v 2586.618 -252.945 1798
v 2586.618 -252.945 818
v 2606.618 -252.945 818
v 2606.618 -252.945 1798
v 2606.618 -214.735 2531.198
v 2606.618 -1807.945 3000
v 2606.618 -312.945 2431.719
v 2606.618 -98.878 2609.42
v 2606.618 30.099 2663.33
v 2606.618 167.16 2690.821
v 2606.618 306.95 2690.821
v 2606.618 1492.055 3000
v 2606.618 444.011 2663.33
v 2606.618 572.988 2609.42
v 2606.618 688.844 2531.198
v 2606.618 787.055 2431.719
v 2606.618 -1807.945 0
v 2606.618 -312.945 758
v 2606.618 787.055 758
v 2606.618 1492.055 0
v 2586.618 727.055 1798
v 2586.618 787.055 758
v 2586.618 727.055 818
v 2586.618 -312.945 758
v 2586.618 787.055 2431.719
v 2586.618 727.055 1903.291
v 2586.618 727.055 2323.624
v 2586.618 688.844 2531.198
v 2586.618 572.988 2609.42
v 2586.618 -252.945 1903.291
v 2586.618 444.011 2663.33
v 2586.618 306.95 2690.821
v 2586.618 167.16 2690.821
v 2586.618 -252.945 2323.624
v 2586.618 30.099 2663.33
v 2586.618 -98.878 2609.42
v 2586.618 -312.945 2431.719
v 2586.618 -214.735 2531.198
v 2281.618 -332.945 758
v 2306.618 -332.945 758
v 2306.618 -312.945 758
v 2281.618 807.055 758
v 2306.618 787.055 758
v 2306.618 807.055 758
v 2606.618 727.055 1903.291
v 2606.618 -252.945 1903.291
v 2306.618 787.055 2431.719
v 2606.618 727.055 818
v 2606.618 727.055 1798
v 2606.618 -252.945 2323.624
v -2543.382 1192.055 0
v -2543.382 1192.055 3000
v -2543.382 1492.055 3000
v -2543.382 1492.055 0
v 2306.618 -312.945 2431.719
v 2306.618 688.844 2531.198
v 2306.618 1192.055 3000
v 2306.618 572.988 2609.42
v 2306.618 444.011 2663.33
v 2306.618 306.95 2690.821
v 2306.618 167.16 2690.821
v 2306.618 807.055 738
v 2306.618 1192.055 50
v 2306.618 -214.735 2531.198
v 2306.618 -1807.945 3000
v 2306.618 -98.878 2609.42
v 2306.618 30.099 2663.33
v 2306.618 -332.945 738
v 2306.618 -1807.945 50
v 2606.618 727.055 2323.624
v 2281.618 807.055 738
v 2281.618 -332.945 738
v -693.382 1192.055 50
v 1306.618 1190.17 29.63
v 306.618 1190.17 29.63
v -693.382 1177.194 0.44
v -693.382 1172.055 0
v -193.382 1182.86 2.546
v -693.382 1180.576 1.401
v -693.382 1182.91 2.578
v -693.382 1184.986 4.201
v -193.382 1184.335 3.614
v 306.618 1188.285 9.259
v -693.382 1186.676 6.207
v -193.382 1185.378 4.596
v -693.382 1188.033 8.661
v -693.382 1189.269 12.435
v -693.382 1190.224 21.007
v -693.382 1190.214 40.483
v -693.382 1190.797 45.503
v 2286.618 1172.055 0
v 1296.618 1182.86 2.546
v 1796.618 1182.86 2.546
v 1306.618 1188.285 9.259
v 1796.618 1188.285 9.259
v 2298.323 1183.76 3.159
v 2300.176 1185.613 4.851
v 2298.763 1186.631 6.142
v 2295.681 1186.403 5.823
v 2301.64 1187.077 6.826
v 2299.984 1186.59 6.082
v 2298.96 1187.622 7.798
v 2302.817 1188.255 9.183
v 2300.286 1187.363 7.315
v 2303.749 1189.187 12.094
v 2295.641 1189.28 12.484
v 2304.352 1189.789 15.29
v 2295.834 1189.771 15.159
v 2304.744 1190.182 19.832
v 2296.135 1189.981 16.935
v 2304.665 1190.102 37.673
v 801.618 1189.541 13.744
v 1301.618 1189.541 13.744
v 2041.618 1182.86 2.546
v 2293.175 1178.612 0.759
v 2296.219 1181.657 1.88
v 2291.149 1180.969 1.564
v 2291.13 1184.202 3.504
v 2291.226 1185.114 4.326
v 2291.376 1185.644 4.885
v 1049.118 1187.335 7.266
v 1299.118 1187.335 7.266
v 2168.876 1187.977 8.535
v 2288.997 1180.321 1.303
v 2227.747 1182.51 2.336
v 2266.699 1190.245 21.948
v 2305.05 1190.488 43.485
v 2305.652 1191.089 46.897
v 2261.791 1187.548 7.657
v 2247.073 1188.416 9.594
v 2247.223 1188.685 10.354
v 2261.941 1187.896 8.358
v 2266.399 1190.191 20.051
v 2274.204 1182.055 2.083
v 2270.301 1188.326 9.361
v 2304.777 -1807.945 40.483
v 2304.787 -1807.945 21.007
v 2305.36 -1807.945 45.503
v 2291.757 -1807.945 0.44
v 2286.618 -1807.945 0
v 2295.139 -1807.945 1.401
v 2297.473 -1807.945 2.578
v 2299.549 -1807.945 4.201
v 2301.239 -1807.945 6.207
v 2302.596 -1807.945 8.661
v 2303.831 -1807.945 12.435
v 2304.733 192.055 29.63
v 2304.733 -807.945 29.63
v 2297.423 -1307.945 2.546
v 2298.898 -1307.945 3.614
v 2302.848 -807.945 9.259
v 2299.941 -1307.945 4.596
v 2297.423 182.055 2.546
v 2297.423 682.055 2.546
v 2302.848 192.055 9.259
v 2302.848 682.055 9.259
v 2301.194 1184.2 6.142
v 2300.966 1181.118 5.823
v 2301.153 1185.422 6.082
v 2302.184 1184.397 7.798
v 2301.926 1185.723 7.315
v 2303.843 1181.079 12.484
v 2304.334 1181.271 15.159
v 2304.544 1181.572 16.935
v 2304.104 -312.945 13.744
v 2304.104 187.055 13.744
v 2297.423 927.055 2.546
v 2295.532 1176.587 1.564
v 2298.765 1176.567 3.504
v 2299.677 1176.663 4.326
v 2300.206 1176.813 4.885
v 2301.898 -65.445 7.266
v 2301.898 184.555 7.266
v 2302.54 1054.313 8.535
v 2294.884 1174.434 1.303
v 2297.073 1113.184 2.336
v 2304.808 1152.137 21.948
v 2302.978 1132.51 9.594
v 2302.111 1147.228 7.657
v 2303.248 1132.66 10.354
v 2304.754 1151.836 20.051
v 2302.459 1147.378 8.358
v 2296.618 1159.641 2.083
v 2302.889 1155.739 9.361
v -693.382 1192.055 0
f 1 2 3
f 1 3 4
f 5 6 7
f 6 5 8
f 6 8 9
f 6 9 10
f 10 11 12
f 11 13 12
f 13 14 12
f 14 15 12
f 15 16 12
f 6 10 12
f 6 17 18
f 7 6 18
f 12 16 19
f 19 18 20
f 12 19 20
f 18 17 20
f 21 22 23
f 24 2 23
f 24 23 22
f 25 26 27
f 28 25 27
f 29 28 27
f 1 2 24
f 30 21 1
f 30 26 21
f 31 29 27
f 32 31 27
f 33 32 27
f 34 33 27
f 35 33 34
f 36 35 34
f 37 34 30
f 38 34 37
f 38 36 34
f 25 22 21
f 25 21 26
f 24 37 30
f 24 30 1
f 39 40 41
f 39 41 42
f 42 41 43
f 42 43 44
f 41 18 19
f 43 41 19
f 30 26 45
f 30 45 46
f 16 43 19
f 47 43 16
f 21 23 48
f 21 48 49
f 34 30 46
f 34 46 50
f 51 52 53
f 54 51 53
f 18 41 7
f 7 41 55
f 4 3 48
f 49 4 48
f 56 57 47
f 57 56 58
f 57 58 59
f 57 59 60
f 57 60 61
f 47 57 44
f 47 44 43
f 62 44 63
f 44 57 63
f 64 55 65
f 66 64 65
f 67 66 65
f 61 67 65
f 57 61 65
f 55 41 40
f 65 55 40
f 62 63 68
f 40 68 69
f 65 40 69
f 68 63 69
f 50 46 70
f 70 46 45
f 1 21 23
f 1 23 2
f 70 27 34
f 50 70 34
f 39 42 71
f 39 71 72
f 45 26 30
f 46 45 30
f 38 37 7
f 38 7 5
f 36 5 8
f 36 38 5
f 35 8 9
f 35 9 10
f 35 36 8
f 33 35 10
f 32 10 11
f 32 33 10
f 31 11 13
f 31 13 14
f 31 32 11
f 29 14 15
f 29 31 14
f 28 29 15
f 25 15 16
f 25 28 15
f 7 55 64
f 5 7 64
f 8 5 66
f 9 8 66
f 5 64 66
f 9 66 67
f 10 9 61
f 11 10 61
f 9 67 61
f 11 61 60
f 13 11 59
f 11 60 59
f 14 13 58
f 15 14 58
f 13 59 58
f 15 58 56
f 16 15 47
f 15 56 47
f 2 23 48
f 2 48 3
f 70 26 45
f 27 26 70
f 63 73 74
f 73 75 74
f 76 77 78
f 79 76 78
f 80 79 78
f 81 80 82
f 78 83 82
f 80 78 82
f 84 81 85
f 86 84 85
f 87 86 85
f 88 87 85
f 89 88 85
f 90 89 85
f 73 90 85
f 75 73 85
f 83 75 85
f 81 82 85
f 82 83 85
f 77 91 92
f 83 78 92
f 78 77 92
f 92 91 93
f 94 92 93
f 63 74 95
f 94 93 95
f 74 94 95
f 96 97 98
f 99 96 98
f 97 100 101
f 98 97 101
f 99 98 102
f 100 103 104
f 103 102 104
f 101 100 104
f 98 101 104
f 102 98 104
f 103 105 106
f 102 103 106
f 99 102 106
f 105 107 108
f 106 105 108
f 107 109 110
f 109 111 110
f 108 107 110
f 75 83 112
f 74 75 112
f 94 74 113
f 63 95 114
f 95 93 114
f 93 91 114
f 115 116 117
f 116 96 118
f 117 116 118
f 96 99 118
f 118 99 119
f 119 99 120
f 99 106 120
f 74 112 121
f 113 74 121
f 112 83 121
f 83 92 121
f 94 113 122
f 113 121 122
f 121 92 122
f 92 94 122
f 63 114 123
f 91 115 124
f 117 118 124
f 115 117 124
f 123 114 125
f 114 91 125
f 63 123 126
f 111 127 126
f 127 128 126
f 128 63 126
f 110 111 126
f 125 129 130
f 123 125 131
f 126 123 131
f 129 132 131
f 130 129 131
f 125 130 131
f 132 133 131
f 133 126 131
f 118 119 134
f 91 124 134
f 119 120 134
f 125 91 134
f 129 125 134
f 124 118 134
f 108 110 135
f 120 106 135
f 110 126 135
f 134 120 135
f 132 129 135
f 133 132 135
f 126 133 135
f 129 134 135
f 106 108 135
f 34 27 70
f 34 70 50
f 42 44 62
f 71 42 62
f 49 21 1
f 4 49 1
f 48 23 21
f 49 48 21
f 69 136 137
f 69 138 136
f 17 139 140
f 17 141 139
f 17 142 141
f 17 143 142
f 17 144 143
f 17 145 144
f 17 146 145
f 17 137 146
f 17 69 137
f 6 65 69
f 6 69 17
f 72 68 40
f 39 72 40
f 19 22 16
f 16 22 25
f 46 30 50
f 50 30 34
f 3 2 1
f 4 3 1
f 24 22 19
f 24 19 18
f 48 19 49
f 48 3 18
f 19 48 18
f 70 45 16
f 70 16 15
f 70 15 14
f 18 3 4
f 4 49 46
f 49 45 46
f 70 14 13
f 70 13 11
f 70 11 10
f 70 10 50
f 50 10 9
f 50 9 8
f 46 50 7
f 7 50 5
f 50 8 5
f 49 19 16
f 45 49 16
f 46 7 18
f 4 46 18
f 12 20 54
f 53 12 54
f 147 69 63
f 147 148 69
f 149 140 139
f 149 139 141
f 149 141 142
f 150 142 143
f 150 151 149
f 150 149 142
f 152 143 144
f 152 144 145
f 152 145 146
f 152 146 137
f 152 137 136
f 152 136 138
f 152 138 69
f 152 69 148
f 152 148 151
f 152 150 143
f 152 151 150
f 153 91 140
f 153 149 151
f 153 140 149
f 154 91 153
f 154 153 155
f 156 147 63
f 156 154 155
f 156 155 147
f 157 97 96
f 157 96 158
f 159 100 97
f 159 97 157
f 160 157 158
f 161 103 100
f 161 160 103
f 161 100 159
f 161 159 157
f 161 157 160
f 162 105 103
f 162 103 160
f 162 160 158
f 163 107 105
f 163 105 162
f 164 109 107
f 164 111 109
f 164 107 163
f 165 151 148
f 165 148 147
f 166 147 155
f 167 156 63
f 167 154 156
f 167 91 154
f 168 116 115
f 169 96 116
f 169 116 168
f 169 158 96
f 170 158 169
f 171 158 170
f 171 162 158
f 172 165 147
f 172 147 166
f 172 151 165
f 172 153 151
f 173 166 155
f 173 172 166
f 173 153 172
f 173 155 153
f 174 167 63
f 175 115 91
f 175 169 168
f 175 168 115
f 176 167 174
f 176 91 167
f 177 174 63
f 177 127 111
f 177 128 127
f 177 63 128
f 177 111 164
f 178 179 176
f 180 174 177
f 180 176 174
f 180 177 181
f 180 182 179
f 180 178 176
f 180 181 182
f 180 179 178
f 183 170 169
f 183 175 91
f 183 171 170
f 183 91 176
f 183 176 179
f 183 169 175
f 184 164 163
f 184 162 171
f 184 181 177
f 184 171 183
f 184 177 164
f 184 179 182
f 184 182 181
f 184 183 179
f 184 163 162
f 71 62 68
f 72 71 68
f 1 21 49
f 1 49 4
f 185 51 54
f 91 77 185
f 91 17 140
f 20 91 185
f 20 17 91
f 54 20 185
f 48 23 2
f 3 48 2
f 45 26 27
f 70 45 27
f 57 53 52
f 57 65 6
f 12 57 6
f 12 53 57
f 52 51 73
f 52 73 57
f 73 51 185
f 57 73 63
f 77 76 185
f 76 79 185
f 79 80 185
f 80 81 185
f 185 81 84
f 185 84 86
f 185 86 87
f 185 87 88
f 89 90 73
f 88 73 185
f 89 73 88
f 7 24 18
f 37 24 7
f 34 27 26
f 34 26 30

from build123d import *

# Parameters (mm, degrees)
F0_W     = 4850
F0_H     = 300
F1_DEPTH = 3000
F2_W     = 1100
F2_H     = 1673.7191037759
F2_W_2   = 980
F2_H_2   = 980
F2_H_3   = 420.3325510025
F3_DEPTH = 300
F4_DEPTH = 25
F5_DEPTH = 280
F6_START = -280
F6_DEPTH = 20
F8_DEPTH = 3000
F9_ANGLE = 90


with BuildPart() as f1:
    # F0 (on Top) → F1 (new body)
    with BuildSketch(Plane.XY):
        with Locations((-118.3822158854, 1342.0549451652)):
            Rectangle(F0_W, F0_H)
        Polygon((2606.6177841146, 1492.0549451652), (2306.6177841146, 1492.0549451652), (2306.6177841146, 1192.0549451652), (2306.6177841146, -1807.9450548348), (2606.6177841146, -1807.9450548348), align=None)
    extrude(amount=F1_DEPTH)

    # F2 (on face) → F3 (cut)
    with BuildSketch(Plane(origin=(2306.6177841146, 0, 0), x_dir=(0, -1, 0), z_dir=(-1, 0, 0))):
        with Locations((-237.0549451652, 1594.859551888)):
            Rectangle(F2_W, F2_H)
        with Locations((-237.0549451652, 1308)):
            Rectangle(F2_W_2, F2_H_2, mode=Mode.SUBTRACT)
        with Locations((-237.0549451652, 2113.4576201439)):
            Rectangle(F2_W_2, F2_H_3, mode=Mode.SUBTRACT)
        with BuildLine():
            ThreePointArc((312.9450548348, 2431.7191037759), (-237.0549451652, 2694.2833315194), (-787.0549451652, 2431.7191037759))
            Line((-787.0549451652, 2431.7191037759), (312.9450548348, 2431.7191037759))
        make_face()
    extrude(amount=-F3_DEPTH, mode=Mode.SUBTRACT)

    # F2 (on face) → F4 (join)
    with BuildSketch(Plane(origin=(2306.6177841146, 0, 0), x_dir=(0, -1, 0), z_dir=(-1, 0, 0))):
        Polygon((312.9450548348, 758), (-787.0549451652, 758), (-807.0549451652, 758), (-807.0549451652, 738), (332.9450548348, 738), (332.9450548348, 758), align=None)
    extrude(amount=F4_DEPTH)

    # F2 (on face) → F5 (cut)
    with BuildSketch(Plane(origin=(2306.6177841146, 0, 0), x_dir=(0, -1, 0), z_dir=(-1, 0, 0))):
        with Locations((-237.0549451652, 2113.4576201439)):
            Rectangle(F2_W_2, F2_H_3)
        with Locations((-237.0549451652, 1308)):
            Rectangle(F2_W_2, F2_H_2)
    extrude(amount=-F5_DEPTH, mode=Mode.SUBTRACT)



with BuildPart() as f6:
    # F2 (on face) → F6 (new body)
    with BuildSketch(Plane(origin=(2306.6177841146, 0, 0), x_dir=(0, -1, 0), z_dir=(-1, 0, 0)).offset(F6_START)):
        with Locations((-237.0549451652, 1594.859551888)):
            Rectangle(F2_W, F2_H)
        with Locations((-237.0549451652, 1308)):
            Rectangle(F2_W_2, F2_H_2, mode=Mode.SUBTRACT)
        with Locations((-237.0549451652, 2113.4576201439)):
            Rectangle(F2_W_2, F2_H_3, mode=Mode.SUBTRACT)
        with BuildLine():
            ThreePointArc((312.9450548348, 2431.7191037759), (-237.0549451652, 2694.2833315194), (-787.0549451652, 2431.7191037759))
            Line((-787.0549451652, 2431.7191037759), (312.9450548348, 2431.7191037759))
        make_face()
    extrude(amount=-F6_DEPTH)


with BuildPart() as f8:
    # F7 (on face) → F8 (new body)
    with BuildSketch(Plane.XZ.offset(-1192.0549451652)):
        with BuildLine():
            Line((2286.6177841146, 0), (2306.6177841146, 0))
            Line((2306.6177841146, 0), (2306.6177841146, 50))
            add(Edge.make_bspline(
                [(2286.6177841146, 0), (2314.8031234741, 0), (2299.951117448, 33.3333333333), (2306.6177841146, 50)],
                knots=[0, 0, 0, 0, 53.8516480713, 53.8516480713, 53.8516480713, 53.8516480713], degree=3))
        make_face()
    extrude(amount=F8_DEPTH)


with BuildPart() as f9_1:
    # F9: copy of F8
    add(f8.part.rotate(Axis((2306.6177841146, 1192.0549451652, 1500), (0, 0, -1)), F9_ANGLE))


with BuildPart() as f1_1:
    add(f1.part)

    add(f8.part)  # F10 merges F8

    add(f9_1.part)  # F10 merges F9_1
    # F10: F9_1 across face
    add(f9_1.part.mirror(Plane(origin=(-118.3822158854, 1192.0549451652, 1500), x_dir=(1, 0, 0), z_dir=(0, -1, 0))))


solid = Compound([f6.part, f1_1.part])
